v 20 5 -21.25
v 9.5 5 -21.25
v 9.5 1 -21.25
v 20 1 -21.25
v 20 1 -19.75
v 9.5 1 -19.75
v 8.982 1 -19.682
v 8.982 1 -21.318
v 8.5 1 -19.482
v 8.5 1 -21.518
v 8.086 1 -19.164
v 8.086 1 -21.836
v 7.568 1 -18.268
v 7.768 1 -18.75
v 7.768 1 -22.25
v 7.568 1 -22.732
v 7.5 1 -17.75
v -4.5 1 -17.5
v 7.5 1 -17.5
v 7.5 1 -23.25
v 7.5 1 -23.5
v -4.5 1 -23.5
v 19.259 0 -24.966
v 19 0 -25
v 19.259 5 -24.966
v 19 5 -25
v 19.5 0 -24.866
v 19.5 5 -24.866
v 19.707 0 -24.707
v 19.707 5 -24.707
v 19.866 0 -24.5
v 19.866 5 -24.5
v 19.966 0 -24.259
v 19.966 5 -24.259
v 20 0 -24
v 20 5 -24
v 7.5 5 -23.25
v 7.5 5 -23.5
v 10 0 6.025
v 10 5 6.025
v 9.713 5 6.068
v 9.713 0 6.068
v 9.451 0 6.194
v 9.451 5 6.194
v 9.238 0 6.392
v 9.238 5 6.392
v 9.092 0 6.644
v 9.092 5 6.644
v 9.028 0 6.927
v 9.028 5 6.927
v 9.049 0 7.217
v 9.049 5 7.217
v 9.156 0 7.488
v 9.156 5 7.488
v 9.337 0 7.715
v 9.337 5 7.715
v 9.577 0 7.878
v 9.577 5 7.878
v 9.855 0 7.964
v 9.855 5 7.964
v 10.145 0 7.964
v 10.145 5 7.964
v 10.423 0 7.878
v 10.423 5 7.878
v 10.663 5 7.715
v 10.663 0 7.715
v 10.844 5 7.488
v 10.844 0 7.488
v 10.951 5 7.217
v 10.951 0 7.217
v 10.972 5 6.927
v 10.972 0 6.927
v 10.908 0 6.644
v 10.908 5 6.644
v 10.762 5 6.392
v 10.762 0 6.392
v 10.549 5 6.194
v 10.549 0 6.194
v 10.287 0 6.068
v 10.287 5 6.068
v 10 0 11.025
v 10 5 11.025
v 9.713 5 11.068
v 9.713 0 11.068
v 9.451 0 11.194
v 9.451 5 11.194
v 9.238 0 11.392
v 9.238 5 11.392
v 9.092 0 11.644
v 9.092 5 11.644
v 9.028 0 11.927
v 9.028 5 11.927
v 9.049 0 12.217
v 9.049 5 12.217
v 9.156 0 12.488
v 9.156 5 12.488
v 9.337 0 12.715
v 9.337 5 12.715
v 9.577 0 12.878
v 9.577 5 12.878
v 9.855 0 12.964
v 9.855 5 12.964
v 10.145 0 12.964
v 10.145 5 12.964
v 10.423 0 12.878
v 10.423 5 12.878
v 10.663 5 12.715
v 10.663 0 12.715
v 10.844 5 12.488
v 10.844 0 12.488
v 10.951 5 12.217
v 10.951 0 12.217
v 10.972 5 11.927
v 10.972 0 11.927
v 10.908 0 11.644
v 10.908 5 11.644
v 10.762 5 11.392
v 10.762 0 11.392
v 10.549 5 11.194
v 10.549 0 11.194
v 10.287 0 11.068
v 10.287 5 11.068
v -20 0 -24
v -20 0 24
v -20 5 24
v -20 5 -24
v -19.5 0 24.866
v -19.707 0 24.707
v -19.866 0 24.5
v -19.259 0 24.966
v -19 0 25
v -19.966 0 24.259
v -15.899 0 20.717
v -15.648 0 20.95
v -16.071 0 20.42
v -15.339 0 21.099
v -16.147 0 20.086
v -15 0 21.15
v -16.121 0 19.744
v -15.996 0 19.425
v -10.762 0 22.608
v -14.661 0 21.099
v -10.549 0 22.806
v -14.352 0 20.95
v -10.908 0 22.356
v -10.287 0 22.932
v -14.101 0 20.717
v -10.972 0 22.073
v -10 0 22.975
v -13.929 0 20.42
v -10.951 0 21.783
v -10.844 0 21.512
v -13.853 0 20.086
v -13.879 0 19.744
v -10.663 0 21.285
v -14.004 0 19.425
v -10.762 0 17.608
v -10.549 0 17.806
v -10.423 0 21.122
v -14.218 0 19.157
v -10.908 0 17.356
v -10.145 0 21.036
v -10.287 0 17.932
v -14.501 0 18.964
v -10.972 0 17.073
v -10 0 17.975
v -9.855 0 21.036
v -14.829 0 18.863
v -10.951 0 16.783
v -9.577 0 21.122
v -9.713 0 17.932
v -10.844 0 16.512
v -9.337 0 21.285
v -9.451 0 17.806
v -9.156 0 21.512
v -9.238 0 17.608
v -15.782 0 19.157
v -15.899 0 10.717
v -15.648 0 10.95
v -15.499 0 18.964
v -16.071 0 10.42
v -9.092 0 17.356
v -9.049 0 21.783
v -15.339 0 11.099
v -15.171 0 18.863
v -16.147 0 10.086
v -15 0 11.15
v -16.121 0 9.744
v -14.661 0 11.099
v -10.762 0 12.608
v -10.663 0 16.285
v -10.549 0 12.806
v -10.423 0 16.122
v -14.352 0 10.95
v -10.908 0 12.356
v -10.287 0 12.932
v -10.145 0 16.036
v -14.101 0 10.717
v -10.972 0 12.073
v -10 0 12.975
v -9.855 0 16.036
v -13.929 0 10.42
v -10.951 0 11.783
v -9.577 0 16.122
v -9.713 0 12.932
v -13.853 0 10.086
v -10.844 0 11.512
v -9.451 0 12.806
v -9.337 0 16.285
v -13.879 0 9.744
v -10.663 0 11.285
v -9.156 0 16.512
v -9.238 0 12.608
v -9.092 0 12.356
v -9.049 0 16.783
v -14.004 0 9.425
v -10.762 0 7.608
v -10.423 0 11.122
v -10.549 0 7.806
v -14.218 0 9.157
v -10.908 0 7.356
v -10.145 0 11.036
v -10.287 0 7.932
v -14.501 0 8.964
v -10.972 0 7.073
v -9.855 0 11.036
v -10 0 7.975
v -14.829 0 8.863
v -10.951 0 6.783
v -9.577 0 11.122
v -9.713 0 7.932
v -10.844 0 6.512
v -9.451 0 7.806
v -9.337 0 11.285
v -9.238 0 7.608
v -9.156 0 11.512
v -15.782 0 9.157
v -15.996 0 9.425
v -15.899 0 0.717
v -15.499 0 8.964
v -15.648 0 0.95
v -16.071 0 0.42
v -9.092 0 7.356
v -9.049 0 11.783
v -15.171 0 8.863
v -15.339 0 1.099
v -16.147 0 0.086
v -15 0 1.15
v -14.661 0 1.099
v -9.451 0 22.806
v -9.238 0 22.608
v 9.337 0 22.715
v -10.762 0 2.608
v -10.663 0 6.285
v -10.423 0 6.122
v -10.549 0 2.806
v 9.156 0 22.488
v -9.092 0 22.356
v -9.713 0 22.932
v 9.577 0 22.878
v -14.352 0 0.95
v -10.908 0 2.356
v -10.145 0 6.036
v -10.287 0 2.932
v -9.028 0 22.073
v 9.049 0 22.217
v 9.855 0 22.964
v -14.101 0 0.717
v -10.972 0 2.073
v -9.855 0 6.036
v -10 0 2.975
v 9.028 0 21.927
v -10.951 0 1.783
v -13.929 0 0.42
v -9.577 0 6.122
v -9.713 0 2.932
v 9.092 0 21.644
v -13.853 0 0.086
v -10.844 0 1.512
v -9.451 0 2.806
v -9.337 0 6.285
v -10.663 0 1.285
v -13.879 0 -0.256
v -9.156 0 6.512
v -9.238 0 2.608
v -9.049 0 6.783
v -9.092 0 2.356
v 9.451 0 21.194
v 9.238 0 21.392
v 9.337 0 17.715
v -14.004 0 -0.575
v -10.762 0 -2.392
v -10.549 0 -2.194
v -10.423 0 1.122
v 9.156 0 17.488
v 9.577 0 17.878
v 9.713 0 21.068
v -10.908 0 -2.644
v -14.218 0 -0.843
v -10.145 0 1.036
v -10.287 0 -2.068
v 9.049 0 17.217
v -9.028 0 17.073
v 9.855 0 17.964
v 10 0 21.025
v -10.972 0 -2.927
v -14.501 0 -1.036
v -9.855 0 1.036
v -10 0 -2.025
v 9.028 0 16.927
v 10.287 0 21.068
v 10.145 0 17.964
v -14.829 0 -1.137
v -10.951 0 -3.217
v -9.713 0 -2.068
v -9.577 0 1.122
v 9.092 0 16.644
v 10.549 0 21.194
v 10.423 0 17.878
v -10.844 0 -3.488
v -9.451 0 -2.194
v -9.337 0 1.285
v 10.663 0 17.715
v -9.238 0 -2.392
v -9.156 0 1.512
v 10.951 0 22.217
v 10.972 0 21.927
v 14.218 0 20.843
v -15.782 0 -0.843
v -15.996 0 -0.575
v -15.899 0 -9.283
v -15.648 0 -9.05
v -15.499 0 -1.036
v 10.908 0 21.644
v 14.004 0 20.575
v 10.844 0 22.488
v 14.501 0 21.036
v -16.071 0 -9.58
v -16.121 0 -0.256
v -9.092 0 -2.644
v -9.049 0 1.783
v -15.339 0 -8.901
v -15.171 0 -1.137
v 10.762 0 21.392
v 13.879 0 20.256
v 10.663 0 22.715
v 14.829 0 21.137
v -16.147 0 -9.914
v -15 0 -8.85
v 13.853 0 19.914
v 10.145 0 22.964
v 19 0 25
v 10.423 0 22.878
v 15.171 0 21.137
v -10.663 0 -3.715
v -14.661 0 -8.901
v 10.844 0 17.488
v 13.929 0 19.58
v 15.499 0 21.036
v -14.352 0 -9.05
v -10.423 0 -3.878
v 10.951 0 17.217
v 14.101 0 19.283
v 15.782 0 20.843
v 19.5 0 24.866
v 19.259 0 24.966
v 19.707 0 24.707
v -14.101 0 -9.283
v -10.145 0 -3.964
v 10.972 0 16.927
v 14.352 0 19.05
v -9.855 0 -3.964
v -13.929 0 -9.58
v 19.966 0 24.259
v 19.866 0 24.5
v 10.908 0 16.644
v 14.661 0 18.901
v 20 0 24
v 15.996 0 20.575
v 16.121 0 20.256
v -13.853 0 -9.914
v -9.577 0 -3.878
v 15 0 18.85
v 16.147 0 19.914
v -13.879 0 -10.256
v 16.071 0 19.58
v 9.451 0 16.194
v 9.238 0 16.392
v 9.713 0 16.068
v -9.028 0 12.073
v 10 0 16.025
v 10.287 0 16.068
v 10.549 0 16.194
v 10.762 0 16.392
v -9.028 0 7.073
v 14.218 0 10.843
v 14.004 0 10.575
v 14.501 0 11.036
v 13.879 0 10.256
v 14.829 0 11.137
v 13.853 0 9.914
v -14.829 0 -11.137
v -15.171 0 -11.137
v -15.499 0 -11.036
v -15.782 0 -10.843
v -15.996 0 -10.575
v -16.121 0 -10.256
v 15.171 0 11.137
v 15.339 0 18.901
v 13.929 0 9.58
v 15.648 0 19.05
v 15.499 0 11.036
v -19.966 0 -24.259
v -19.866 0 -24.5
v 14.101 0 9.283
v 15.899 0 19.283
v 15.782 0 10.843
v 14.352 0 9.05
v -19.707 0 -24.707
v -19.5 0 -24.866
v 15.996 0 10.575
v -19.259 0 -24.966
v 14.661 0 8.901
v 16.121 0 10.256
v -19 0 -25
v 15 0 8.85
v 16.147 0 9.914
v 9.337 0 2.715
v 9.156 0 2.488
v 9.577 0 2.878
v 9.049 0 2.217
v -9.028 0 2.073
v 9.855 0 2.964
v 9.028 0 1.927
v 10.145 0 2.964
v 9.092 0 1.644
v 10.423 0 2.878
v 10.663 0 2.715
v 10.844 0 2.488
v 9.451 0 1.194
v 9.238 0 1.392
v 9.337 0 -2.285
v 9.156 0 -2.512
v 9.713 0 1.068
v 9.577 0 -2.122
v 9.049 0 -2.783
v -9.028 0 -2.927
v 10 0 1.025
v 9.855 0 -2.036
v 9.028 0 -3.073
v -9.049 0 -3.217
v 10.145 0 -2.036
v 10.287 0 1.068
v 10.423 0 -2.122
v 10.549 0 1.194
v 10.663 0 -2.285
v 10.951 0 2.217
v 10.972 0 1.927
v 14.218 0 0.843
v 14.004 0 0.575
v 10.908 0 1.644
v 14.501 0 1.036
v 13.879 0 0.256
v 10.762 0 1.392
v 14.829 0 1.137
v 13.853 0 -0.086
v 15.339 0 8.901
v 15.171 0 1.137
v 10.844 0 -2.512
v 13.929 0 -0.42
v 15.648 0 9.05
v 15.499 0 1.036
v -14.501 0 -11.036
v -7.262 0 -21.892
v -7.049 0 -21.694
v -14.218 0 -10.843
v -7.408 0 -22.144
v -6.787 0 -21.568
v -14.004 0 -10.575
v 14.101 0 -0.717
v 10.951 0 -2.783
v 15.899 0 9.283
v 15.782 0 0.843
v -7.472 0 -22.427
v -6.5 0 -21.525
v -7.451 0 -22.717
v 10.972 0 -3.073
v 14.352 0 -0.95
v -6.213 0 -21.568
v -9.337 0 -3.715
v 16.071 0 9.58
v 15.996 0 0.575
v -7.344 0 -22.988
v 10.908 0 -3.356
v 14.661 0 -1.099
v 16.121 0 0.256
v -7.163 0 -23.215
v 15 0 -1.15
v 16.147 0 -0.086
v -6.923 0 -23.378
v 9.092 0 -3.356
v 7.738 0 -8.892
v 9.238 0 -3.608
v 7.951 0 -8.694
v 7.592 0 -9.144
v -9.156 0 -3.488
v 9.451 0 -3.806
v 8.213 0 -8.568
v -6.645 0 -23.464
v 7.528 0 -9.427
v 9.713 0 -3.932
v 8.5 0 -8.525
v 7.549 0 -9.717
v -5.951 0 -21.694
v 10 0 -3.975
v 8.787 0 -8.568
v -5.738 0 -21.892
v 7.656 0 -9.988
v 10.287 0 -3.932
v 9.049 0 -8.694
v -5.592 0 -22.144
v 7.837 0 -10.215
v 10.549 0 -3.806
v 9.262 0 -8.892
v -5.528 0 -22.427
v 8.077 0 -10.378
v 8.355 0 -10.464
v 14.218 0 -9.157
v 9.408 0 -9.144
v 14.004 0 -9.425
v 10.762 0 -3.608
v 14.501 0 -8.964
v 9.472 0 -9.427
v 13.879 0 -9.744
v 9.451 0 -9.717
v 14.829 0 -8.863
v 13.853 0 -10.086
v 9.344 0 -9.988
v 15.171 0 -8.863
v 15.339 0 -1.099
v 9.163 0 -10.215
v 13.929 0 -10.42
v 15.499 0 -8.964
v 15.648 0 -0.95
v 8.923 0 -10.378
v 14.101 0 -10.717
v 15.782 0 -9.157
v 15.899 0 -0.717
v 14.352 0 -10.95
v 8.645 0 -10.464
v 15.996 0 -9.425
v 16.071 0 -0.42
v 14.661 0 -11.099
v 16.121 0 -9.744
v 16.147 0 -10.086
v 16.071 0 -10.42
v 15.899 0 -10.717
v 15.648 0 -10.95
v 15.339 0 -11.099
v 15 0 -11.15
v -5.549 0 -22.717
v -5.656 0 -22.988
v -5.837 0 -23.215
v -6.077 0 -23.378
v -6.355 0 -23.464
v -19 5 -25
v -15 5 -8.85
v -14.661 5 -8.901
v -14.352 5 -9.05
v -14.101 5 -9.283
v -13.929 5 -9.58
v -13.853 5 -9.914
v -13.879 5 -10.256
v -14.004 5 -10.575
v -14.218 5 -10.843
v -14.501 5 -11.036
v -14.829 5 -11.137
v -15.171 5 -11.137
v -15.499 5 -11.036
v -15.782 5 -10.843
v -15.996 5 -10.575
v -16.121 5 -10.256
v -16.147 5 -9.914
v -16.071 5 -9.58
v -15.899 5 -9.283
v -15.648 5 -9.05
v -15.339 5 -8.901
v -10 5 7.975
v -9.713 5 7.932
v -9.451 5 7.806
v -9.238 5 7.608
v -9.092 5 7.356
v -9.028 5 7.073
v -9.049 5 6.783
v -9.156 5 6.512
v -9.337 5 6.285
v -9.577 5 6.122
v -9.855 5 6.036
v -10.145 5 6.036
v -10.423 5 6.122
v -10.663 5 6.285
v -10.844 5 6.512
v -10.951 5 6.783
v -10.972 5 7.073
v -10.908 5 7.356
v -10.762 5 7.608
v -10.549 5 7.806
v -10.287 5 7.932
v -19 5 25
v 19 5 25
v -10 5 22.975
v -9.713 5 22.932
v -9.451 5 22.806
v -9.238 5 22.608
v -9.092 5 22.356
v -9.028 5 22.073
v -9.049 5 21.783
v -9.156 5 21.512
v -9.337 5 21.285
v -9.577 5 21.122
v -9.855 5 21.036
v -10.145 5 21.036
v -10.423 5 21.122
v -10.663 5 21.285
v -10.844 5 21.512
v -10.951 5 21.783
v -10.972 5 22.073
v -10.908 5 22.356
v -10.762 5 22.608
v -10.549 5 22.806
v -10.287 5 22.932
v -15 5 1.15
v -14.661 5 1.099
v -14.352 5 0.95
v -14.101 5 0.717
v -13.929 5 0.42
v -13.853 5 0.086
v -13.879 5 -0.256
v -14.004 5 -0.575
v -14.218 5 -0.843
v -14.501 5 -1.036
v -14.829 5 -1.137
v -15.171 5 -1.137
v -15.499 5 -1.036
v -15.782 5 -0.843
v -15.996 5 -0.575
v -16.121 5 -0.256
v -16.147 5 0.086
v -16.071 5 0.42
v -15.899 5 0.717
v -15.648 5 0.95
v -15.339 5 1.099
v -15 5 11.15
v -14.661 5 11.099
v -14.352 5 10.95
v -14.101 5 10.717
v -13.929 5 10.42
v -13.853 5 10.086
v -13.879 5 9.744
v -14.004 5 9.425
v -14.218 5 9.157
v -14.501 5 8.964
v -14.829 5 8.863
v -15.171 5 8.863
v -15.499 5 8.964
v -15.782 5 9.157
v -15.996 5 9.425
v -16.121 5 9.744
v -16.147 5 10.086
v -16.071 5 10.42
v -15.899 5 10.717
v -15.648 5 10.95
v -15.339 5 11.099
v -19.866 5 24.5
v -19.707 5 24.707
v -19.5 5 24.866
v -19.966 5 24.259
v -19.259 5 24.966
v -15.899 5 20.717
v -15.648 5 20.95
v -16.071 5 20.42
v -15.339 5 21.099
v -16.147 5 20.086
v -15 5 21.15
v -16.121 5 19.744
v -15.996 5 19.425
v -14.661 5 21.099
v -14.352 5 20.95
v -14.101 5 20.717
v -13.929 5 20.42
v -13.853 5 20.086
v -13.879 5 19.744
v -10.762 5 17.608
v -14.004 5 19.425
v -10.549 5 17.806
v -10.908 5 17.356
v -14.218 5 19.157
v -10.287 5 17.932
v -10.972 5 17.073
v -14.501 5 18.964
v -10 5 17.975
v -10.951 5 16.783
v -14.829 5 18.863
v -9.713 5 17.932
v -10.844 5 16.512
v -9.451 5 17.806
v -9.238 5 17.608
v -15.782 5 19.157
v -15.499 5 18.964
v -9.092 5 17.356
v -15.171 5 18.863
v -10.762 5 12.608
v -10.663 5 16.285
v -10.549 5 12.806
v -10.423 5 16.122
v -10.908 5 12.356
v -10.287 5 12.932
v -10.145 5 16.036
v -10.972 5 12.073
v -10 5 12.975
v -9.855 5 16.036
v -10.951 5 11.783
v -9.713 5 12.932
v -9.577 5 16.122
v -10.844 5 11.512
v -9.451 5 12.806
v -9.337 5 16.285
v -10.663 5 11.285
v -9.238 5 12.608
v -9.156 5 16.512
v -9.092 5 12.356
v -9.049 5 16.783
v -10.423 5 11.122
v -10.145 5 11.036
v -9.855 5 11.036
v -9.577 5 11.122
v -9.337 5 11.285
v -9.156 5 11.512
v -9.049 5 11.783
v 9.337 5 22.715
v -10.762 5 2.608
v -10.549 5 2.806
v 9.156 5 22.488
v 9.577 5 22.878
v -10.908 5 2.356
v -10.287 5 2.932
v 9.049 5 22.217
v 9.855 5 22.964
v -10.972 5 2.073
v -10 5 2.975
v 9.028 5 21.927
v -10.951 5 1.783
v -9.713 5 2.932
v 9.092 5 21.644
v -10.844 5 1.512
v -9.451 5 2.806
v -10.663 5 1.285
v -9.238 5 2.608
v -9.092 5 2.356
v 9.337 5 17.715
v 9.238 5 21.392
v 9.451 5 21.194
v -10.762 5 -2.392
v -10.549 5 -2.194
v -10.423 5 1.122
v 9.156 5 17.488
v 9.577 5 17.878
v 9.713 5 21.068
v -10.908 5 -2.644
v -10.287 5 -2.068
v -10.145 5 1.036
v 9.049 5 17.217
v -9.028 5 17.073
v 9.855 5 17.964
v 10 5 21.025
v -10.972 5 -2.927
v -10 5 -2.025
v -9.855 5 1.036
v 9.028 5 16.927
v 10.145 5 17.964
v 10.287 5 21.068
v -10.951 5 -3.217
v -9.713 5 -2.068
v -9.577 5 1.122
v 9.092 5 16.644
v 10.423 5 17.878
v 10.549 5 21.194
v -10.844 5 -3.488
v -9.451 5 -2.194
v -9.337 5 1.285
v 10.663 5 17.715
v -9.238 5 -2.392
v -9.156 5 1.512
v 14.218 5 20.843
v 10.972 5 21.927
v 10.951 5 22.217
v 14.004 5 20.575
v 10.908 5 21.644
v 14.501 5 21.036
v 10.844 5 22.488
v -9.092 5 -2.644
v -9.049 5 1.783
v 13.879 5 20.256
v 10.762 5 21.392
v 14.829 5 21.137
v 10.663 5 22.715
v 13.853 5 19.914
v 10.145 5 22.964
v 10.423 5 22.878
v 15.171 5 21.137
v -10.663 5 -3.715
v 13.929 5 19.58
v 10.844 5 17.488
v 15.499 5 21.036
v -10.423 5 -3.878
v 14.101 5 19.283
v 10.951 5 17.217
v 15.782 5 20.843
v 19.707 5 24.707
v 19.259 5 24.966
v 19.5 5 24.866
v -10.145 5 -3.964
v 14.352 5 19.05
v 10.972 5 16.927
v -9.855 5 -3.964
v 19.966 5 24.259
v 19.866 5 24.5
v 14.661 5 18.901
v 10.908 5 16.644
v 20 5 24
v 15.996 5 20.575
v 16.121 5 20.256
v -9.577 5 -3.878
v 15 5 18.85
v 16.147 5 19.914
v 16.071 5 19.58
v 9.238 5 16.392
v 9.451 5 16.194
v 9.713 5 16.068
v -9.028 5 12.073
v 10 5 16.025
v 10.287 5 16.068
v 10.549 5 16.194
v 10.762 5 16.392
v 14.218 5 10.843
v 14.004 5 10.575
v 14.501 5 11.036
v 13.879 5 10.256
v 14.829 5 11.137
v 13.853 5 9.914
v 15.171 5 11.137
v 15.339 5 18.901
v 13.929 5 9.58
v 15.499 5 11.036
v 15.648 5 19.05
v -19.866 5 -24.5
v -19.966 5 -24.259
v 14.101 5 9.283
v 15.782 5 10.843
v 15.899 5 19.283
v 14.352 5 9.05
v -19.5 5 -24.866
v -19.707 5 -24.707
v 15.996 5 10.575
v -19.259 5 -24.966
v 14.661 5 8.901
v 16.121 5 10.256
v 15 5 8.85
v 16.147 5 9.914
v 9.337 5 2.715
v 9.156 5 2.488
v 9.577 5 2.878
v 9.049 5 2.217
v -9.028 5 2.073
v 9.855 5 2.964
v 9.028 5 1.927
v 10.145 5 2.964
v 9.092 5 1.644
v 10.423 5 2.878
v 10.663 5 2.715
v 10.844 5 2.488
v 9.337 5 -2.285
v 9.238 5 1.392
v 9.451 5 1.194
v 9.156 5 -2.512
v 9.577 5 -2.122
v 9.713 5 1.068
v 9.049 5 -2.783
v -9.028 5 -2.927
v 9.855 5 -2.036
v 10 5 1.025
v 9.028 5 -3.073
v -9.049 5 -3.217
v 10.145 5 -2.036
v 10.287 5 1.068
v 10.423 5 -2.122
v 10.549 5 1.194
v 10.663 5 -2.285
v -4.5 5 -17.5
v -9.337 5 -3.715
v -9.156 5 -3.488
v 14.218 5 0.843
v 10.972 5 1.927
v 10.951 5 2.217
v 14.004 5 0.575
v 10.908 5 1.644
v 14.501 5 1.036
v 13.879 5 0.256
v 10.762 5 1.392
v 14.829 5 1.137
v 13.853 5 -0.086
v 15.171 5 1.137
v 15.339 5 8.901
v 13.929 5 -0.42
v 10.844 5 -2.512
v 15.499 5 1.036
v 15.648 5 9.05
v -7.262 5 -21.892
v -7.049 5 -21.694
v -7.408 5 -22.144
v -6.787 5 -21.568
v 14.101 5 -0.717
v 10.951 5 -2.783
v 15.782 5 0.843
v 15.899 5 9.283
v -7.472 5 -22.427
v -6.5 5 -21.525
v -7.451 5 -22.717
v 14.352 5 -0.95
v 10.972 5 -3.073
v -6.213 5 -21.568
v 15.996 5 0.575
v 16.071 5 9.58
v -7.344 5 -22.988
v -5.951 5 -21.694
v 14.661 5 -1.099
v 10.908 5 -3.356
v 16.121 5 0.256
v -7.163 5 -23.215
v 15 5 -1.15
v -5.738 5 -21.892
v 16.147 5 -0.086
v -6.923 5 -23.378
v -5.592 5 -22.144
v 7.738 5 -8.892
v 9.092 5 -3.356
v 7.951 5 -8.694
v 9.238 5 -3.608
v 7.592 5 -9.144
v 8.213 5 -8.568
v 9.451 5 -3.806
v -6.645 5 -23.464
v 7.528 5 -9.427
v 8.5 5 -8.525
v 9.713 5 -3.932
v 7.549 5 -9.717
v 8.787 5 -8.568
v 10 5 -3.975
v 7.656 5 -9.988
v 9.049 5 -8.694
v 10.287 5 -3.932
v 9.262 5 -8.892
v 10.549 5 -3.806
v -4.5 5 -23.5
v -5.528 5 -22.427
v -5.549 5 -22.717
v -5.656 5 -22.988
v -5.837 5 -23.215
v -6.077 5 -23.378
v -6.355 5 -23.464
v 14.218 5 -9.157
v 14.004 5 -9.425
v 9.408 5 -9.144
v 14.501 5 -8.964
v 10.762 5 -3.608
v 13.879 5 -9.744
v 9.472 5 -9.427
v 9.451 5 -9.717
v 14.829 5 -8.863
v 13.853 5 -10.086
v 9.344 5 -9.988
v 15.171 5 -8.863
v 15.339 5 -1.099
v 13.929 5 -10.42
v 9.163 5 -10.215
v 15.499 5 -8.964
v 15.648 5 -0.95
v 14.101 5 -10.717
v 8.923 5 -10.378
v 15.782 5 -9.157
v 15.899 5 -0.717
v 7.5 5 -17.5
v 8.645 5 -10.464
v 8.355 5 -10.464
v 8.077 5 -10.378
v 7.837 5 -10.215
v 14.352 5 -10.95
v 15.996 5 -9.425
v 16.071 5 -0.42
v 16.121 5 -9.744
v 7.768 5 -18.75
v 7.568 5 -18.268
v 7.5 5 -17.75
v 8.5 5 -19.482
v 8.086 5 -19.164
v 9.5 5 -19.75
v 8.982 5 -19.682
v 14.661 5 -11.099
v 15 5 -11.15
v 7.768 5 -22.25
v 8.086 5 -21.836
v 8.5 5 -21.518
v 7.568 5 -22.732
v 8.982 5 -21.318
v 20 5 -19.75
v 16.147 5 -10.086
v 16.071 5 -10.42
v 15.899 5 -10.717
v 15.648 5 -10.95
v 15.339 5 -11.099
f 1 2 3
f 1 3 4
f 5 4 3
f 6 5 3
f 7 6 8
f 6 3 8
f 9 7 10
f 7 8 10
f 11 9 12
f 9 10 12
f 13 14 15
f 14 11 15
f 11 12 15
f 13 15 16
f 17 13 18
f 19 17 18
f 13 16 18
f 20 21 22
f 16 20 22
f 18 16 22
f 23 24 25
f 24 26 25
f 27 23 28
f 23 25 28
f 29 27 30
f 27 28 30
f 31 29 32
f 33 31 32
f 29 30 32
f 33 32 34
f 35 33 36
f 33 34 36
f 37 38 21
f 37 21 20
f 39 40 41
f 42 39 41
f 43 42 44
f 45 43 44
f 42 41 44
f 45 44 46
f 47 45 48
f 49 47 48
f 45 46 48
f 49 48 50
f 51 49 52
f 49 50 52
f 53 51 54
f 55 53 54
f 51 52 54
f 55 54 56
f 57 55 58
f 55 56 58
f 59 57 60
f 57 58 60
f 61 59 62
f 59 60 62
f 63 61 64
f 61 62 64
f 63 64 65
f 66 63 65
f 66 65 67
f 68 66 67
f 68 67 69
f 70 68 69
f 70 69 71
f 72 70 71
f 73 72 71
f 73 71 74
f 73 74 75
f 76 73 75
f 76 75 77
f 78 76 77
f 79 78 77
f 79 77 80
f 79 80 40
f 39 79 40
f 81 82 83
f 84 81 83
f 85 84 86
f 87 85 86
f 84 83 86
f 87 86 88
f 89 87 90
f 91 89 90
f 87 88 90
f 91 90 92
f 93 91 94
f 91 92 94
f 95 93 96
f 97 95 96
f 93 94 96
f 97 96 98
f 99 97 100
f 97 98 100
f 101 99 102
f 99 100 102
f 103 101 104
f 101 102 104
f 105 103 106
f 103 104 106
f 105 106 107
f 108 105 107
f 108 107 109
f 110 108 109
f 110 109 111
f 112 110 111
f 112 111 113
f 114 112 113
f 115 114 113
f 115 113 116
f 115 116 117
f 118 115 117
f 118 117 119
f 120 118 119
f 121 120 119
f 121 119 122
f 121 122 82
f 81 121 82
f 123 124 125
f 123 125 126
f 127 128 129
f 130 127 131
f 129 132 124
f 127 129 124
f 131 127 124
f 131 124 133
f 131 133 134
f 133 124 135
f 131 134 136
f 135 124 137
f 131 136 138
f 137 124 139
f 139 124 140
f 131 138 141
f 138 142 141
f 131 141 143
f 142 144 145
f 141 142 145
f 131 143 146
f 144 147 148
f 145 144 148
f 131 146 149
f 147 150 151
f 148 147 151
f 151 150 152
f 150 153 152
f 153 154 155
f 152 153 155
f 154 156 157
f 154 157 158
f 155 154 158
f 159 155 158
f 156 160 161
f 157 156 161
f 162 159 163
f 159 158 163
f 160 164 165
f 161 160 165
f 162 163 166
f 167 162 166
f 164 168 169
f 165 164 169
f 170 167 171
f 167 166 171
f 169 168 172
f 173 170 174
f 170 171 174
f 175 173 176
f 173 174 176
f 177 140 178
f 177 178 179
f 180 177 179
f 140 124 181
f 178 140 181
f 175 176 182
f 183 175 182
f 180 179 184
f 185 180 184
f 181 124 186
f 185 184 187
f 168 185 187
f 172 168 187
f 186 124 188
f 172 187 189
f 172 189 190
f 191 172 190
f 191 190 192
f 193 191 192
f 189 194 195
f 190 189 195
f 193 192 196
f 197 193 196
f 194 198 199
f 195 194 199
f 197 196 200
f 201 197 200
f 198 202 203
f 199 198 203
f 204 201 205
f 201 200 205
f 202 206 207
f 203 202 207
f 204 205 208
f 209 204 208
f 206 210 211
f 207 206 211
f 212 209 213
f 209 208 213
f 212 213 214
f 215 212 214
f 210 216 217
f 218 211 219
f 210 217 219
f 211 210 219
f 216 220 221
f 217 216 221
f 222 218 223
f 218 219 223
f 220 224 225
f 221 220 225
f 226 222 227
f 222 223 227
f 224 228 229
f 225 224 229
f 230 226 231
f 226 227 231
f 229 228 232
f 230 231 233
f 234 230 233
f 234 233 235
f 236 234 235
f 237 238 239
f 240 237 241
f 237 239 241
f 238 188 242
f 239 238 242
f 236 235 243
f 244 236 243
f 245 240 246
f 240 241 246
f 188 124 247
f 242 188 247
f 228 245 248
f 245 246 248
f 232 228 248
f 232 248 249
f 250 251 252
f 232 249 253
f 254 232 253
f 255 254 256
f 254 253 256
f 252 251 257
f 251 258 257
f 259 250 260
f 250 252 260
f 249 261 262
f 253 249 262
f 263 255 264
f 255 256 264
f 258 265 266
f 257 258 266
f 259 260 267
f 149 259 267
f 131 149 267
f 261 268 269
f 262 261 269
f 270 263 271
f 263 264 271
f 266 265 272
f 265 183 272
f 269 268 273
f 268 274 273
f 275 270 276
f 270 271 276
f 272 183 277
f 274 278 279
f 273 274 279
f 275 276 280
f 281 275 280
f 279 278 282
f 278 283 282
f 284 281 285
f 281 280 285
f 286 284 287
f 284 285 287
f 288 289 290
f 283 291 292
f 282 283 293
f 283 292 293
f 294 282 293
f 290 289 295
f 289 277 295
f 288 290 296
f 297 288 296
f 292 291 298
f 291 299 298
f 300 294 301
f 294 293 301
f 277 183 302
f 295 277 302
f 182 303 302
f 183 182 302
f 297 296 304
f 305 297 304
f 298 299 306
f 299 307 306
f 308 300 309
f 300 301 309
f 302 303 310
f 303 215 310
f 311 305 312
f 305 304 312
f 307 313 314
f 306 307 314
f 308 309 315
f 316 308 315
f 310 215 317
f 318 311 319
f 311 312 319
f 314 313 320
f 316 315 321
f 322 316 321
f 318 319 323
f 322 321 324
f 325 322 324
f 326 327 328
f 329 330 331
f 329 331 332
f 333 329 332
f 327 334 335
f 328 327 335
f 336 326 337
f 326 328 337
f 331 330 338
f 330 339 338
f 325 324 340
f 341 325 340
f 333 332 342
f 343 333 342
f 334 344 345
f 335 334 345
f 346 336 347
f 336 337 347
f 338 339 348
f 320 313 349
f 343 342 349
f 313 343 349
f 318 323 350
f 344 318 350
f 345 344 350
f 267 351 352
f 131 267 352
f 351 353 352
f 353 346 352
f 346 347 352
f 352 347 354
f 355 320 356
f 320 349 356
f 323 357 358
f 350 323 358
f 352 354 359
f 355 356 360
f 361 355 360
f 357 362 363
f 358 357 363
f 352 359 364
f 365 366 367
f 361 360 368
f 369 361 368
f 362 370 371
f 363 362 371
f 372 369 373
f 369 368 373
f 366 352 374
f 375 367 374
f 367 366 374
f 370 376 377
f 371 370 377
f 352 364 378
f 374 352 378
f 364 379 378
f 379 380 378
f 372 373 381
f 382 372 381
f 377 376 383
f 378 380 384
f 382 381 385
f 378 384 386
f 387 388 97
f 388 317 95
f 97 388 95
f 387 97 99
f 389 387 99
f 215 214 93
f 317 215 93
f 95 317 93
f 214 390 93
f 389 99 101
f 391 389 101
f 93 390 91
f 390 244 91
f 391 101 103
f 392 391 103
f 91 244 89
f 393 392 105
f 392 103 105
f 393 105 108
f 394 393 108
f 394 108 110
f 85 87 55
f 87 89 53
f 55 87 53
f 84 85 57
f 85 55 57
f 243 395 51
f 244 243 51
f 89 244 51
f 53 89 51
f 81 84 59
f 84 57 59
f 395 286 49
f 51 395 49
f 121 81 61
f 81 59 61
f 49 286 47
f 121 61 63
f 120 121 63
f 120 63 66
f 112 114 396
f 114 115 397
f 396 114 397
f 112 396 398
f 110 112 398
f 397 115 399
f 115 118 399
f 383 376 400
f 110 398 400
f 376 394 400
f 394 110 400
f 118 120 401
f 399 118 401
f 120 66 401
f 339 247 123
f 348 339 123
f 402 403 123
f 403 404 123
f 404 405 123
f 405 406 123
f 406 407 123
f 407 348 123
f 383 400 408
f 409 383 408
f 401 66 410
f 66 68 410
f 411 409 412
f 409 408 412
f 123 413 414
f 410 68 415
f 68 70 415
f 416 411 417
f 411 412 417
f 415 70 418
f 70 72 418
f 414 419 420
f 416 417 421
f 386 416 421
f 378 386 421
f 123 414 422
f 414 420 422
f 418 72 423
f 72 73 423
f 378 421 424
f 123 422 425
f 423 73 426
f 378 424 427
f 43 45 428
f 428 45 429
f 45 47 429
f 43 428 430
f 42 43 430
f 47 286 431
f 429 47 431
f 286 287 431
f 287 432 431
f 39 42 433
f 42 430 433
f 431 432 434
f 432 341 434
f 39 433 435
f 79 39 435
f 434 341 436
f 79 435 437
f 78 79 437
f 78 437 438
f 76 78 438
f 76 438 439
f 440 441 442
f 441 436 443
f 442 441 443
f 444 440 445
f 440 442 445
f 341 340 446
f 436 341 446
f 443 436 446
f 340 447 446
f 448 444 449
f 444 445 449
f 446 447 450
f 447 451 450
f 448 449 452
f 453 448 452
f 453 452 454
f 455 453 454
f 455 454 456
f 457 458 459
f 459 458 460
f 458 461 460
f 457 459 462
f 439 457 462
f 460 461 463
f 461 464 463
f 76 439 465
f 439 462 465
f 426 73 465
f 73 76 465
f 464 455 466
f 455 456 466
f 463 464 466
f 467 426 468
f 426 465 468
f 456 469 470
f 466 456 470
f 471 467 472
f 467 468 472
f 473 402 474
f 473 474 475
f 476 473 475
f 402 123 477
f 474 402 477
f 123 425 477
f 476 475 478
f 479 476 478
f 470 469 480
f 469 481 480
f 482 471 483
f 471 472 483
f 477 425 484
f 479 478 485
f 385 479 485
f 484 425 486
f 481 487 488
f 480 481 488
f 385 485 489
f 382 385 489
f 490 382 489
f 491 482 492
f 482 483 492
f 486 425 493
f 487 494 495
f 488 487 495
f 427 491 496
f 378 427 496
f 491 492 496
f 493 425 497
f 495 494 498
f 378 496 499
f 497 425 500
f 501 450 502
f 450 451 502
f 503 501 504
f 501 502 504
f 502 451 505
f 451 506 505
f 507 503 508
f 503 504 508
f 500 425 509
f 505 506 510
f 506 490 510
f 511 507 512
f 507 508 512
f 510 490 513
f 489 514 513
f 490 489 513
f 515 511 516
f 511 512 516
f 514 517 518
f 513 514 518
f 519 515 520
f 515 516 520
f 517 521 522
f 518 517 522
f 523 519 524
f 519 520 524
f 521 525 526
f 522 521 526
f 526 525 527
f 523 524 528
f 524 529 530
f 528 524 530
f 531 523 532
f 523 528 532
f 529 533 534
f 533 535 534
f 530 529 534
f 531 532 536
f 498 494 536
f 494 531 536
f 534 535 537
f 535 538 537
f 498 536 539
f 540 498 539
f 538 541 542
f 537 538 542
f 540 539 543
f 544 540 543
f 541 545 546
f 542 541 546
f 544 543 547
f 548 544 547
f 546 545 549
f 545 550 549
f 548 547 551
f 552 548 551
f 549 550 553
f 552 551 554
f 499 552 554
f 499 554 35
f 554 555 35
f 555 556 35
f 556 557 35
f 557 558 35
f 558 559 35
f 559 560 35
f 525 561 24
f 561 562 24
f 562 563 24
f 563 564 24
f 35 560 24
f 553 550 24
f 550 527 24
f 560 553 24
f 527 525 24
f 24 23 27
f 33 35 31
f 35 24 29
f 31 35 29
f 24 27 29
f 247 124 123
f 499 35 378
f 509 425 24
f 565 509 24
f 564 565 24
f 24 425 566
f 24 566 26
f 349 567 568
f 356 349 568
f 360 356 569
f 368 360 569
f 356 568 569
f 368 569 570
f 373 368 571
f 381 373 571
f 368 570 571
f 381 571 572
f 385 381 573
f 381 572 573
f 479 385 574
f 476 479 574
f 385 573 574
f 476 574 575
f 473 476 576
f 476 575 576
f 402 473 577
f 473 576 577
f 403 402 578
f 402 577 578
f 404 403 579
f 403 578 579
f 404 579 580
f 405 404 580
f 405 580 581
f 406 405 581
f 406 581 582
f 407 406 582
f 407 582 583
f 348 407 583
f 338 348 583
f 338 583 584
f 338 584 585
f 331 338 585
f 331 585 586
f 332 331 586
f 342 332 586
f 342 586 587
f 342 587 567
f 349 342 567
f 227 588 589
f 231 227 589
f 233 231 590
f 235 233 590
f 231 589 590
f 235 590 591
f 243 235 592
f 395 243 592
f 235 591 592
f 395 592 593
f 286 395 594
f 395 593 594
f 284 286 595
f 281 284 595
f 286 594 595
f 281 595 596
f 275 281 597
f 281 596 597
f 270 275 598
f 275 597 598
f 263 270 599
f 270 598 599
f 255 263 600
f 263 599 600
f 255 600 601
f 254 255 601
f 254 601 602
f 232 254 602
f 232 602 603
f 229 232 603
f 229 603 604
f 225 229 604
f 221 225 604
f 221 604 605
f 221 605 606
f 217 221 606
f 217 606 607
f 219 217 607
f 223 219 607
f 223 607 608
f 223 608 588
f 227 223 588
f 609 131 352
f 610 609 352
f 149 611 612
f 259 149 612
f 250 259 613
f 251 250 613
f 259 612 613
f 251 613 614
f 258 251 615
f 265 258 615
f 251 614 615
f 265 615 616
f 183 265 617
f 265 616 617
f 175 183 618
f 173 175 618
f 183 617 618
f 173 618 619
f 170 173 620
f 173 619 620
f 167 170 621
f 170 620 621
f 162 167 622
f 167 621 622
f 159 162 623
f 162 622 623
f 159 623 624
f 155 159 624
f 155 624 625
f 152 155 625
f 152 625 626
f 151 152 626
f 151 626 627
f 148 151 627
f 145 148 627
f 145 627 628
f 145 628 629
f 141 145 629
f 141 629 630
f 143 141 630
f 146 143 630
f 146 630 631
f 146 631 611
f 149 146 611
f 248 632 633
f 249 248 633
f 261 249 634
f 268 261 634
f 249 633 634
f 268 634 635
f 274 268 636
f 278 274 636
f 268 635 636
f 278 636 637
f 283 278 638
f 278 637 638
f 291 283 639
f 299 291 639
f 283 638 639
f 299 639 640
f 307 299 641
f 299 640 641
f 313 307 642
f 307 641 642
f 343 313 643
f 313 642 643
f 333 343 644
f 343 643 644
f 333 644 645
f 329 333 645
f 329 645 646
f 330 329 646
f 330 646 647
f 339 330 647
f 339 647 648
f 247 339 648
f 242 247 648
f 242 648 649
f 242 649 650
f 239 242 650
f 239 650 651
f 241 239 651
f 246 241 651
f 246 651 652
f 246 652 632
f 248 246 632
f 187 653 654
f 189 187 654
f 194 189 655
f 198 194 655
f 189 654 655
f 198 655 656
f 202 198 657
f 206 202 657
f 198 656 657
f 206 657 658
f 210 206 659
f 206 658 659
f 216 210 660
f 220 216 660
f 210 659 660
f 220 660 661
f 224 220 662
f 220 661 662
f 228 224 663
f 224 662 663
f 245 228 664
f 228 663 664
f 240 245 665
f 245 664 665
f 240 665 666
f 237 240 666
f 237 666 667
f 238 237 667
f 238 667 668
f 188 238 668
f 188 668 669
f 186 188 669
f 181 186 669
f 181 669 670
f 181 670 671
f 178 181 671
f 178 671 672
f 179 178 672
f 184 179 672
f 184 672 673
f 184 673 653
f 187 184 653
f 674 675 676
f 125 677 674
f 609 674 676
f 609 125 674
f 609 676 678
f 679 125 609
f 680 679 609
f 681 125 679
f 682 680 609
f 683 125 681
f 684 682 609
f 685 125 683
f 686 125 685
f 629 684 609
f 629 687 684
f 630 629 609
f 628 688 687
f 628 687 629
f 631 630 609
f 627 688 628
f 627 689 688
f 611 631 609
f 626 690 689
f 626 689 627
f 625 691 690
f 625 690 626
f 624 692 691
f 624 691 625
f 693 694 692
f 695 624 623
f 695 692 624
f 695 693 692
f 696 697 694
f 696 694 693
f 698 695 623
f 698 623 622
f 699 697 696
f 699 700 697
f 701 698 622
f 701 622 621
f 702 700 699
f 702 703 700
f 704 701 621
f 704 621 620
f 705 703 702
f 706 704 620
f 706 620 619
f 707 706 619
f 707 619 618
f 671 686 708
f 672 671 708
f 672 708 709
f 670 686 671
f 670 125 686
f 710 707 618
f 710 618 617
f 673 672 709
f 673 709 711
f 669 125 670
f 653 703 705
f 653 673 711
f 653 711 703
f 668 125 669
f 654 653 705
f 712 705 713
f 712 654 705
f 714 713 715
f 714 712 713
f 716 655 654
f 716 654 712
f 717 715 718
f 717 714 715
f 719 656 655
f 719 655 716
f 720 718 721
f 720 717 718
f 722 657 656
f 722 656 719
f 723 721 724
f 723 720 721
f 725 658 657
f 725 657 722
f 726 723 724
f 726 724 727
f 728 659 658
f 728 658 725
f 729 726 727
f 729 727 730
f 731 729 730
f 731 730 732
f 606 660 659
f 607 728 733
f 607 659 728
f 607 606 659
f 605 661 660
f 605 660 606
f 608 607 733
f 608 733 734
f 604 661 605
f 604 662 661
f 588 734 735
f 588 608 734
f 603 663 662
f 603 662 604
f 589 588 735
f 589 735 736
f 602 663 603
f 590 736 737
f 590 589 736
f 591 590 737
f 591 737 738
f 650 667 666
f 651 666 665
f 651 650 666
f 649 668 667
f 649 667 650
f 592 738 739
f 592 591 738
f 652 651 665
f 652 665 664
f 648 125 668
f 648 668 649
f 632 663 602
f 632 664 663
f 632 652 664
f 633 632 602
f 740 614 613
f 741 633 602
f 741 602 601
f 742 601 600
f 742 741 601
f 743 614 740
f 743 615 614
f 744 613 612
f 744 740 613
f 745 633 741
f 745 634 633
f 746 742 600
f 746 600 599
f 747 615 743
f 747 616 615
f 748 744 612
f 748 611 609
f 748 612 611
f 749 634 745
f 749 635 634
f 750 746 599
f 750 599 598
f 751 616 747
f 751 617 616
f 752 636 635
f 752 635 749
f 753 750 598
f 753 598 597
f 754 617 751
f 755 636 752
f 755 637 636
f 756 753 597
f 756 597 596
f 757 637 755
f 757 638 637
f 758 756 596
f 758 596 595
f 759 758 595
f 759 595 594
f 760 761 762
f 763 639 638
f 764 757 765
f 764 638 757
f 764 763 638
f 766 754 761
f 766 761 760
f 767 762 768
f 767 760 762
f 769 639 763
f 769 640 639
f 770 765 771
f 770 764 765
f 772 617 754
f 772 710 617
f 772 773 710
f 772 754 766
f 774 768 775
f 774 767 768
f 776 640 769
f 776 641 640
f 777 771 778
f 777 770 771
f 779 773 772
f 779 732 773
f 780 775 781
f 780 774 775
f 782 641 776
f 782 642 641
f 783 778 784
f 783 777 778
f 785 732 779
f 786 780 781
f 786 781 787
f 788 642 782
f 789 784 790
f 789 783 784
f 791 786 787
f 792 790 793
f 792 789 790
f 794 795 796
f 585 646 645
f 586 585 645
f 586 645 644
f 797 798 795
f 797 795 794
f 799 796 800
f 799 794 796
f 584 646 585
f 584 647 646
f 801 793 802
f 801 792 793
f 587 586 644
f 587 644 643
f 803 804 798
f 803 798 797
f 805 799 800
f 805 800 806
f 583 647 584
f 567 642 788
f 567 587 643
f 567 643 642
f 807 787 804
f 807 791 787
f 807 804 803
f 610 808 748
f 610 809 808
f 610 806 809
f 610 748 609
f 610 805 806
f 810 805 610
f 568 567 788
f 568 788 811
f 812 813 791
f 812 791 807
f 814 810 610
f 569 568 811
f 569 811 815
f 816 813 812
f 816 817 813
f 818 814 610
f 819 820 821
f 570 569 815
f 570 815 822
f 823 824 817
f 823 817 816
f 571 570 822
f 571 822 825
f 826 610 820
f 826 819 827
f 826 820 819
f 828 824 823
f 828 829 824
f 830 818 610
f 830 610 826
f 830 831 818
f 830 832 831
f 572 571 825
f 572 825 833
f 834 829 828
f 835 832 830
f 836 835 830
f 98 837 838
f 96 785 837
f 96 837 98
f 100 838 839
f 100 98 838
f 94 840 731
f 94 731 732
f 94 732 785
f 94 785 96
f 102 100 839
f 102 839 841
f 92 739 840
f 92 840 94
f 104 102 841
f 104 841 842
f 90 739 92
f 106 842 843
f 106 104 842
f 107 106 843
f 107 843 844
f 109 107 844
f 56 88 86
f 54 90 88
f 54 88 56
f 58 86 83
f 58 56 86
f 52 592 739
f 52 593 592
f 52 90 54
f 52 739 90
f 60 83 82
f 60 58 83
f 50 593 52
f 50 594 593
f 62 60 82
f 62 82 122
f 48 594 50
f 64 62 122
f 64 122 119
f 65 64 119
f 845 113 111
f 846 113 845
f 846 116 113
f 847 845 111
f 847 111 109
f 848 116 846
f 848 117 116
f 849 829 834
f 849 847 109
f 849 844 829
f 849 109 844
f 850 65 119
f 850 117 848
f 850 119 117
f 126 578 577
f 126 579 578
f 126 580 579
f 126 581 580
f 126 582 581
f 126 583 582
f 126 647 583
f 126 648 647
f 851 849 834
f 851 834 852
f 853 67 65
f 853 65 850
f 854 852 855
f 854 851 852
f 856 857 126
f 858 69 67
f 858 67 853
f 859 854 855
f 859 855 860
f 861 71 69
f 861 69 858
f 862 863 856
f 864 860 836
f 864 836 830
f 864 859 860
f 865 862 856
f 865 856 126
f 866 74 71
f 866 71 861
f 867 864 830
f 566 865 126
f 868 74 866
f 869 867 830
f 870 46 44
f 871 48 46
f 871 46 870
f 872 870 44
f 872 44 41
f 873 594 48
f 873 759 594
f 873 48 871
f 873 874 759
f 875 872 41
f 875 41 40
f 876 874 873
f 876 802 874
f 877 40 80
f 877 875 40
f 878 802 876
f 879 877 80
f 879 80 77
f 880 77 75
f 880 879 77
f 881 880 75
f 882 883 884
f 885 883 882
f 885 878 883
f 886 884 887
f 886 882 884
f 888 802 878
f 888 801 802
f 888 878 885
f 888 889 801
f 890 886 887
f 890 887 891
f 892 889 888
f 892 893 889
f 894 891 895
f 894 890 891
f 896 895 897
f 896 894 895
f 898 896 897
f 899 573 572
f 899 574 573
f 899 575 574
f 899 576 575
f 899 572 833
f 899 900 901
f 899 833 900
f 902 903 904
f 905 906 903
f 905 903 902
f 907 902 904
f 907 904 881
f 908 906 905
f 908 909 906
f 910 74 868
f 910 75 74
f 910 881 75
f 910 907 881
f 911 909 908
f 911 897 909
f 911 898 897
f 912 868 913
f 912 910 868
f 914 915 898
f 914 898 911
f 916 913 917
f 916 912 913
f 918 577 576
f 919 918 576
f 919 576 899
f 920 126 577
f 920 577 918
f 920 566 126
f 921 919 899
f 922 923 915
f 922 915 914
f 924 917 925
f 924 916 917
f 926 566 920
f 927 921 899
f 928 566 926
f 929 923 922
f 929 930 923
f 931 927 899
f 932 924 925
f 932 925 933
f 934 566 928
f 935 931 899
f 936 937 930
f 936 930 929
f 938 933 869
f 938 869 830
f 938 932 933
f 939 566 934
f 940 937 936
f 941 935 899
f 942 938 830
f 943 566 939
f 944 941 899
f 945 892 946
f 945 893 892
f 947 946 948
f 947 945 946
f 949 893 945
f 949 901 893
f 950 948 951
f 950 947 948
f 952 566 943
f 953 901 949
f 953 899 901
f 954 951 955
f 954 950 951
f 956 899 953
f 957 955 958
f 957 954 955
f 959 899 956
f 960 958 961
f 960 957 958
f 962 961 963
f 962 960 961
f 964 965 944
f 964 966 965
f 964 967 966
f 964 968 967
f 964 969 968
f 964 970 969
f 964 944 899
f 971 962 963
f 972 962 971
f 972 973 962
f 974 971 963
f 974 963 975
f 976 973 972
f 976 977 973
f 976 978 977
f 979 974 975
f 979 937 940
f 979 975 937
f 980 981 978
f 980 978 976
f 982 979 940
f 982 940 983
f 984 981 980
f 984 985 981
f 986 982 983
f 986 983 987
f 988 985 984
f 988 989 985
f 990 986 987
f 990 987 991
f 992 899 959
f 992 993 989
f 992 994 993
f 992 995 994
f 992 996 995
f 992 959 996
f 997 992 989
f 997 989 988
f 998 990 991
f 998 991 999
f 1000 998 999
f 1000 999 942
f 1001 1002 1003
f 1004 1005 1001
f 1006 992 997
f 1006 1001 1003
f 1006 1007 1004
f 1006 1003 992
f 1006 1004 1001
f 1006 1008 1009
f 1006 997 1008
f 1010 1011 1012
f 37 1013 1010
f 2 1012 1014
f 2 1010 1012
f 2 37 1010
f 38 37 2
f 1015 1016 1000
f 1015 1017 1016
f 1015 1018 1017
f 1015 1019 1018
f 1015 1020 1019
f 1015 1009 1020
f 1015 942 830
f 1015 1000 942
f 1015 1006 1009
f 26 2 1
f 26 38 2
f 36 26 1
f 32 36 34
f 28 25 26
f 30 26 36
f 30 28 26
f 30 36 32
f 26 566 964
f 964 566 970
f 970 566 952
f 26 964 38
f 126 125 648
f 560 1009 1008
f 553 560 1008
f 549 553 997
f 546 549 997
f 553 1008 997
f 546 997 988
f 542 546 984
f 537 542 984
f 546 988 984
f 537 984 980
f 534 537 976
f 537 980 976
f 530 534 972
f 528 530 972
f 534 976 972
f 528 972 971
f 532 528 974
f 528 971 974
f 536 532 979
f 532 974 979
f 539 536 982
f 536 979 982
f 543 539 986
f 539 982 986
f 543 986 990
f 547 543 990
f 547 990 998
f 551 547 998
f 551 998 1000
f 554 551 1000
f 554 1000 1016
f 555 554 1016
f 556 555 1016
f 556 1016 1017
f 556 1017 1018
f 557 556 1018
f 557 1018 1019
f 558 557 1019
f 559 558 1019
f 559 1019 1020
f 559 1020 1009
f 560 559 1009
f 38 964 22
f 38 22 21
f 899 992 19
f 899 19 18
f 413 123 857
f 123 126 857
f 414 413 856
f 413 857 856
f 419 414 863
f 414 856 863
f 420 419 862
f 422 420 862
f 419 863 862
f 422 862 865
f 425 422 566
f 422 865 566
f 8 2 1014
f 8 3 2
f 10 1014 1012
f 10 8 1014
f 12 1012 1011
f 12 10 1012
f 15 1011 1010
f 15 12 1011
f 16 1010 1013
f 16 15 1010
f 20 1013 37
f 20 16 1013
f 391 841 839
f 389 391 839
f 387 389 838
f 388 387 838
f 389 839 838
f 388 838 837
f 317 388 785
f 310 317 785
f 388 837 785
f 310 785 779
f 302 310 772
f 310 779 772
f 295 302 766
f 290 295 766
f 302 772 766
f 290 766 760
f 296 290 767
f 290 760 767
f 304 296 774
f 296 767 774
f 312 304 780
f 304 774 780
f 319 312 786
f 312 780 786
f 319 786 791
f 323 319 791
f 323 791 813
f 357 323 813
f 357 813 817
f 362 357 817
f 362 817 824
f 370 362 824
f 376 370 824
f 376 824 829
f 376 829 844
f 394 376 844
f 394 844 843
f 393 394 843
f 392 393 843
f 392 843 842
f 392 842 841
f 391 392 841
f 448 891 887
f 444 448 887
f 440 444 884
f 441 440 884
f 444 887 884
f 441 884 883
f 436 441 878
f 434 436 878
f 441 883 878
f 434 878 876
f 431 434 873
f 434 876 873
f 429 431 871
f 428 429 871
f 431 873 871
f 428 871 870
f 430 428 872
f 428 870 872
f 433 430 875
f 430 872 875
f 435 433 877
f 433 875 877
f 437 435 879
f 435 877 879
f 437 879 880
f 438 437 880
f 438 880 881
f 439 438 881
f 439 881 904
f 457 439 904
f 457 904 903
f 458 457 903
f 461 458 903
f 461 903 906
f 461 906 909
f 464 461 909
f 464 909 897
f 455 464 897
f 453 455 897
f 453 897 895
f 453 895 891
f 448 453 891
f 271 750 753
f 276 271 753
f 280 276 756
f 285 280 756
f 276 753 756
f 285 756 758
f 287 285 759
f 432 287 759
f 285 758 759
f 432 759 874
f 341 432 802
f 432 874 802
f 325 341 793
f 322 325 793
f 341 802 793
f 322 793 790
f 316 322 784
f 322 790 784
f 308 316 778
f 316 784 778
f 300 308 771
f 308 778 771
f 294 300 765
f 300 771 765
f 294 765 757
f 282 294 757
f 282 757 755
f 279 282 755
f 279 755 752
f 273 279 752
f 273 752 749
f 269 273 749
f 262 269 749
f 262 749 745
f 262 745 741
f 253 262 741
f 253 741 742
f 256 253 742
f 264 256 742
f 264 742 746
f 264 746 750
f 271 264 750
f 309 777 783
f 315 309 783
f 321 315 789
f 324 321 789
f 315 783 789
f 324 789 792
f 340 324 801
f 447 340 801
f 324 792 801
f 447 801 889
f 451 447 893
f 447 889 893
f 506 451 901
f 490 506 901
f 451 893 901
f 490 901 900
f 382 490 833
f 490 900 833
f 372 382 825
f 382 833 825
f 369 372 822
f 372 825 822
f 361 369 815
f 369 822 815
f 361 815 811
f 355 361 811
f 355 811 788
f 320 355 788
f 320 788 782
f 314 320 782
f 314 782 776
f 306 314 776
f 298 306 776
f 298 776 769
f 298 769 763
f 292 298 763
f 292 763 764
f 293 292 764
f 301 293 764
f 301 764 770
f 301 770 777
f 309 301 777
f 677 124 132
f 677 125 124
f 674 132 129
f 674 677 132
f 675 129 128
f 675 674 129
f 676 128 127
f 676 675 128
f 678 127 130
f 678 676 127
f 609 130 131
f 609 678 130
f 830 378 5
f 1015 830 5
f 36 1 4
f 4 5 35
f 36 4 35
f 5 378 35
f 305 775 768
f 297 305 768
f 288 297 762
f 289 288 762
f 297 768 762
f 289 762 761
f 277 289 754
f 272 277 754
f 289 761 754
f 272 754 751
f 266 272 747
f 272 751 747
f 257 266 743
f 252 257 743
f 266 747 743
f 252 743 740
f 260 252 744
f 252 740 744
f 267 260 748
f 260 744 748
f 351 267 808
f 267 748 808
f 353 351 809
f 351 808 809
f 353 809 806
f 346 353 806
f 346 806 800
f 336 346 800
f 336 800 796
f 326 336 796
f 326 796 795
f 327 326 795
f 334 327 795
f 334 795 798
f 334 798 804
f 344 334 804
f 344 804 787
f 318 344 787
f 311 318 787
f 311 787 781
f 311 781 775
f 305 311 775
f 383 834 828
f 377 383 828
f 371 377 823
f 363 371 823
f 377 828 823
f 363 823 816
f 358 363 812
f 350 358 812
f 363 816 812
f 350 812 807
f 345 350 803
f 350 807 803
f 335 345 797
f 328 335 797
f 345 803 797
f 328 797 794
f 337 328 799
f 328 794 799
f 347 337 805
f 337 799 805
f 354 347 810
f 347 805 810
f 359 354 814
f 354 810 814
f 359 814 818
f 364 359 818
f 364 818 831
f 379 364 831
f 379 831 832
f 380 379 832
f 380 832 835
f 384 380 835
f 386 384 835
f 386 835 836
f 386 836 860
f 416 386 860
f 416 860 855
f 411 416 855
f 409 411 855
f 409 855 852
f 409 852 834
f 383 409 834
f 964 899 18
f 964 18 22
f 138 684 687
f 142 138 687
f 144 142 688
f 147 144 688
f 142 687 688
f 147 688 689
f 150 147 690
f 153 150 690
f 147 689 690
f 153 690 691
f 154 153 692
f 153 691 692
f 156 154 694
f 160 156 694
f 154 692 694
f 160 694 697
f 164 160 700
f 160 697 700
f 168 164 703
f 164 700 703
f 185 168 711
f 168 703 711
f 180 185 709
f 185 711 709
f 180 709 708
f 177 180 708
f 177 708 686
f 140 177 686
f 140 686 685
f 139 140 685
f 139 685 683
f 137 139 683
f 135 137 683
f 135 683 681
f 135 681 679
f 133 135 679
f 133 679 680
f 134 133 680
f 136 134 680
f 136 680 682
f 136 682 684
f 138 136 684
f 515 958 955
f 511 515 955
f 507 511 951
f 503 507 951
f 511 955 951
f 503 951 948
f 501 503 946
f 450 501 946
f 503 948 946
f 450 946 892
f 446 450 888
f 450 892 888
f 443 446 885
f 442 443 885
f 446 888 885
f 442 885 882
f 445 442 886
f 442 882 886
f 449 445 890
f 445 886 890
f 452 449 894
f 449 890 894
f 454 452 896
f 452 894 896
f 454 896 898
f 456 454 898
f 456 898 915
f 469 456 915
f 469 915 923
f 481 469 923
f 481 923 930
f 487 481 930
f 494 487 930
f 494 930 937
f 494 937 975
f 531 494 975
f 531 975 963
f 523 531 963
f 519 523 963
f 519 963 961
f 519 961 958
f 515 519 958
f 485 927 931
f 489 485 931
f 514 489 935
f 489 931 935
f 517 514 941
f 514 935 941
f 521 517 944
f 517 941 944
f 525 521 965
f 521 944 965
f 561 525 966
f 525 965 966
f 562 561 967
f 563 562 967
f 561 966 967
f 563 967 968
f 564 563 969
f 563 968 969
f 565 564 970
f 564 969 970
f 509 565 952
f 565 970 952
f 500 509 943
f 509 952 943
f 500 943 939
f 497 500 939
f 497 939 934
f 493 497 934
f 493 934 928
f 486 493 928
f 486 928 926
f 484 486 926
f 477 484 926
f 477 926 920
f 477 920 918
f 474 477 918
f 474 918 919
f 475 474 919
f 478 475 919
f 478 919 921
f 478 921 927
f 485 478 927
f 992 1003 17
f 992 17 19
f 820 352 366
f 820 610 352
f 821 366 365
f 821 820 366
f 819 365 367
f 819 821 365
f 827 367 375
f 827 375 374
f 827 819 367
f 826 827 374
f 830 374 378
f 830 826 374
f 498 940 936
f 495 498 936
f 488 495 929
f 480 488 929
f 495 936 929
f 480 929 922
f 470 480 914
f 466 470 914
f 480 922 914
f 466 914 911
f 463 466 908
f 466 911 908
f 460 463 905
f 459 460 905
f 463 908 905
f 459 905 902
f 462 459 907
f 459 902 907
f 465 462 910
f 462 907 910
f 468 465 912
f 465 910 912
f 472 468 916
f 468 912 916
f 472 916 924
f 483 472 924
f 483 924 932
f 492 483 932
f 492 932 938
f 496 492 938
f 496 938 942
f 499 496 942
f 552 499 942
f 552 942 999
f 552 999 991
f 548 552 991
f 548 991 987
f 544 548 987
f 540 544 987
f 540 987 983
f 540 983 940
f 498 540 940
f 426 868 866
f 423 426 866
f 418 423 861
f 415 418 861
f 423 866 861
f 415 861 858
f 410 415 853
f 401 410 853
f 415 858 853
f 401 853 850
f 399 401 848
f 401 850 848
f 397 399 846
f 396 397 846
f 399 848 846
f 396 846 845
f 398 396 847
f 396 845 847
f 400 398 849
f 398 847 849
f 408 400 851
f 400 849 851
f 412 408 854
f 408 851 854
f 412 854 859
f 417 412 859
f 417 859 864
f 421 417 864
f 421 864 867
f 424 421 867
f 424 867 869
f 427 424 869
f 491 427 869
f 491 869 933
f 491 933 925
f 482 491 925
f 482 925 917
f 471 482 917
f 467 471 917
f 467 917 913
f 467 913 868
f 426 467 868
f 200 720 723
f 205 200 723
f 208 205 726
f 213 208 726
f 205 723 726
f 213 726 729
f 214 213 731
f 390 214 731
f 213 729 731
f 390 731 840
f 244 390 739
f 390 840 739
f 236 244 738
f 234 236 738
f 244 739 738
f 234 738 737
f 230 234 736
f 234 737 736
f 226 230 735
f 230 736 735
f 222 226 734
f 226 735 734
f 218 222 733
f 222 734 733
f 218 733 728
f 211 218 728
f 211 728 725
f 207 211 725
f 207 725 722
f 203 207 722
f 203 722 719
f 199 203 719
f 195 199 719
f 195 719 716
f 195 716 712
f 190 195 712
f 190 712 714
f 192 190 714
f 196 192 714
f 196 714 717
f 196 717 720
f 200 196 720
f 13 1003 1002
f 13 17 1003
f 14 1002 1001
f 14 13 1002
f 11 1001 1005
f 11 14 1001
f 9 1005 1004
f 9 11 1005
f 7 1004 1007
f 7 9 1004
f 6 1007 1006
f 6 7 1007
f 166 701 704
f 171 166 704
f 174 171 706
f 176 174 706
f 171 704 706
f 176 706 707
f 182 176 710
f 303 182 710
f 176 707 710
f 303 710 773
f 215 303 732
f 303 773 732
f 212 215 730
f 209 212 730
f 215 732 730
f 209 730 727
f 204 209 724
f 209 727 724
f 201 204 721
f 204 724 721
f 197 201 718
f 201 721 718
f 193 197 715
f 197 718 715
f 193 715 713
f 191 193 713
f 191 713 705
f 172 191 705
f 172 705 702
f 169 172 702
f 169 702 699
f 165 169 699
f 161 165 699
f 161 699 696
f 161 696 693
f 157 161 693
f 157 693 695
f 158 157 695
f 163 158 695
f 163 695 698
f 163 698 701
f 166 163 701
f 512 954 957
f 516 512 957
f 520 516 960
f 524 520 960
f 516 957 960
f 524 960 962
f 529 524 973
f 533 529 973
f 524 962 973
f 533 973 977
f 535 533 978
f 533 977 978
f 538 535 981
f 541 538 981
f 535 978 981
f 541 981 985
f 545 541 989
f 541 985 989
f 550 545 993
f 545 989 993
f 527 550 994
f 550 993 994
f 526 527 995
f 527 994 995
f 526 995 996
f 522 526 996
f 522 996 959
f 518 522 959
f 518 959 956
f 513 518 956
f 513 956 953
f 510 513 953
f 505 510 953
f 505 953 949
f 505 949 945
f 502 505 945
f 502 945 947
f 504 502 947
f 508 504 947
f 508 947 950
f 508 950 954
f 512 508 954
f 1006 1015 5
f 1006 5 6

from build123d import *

# Parameters (mm, degrees)
SKETCH1_W           = 40
SKETCH1_H           = 50
BOSS_EXTRUDE1_DEPTH = 5
SKETCH9_R           = 1.15
CUT_EXTRUDE8_DEPTH  = 33.403703492
LPATTERN2_COUNT     = 3
LPATTERN2_PITCH     = 10
LPATTERN2_COL_COUNT = 2
LPATTERN2_COL_PITCH = 10
SKETCH4_R           = 0.975
CUT_EXTRUDE3_DEPTH  = 33.403703492
SKETCH5_R           = 0.975
CUT_EXTRUDE4_DEPTH  = 33.403703492
LPATTERN1_COUNT     = 6
LPATTERN1_PITCH     = 5
FILLET1_R           = 1
CUT_EXTRUDE7_DEPTH  = 4
FILLET2_R           = 2


with BuildPart() as part:
    # Sketch1 → Boss-Extrude1 (new body)
    with BuildSketch(Plane(origin=(0, 0, 0), x_dir=(1, 0, 0), z_dir=(0, 1, 0))):
        Rectangle(SKETCH1_W, SKETCH1_H)
    extrude(amount=BOSS_EXTRUDE1_DEPTH)

    # Sketch9 → Cut-Extrude8 (cut, through all)
    with BuildSketch(Plane(origin=(0, 5, 0), x_dir=(1, 0, 0), z_dir=(0, 1, 0))):
        with Locations(Location((-15, 0, 0), (0, 0, 270))):
            Circle(SKETCH9_R)
        with Locations(Location((15, 0, 0), (0, 0, 90))):
            Circle(SKETCH9_R)
    cut_extrude8 = extrude(amount=-CUT_EXTRUDE8_DEPTH, mode=Mode.SUBTRACT)

    # LPattern2: Cut-Extrude8 ×3
    with Locations(*[(0, 0, i * LPATTERN2_PITCH) for i in range(1, LPATTERN2_COUNT)]):
        add(cut_extrude8, mode=Mode.SUBTRACT)

    # LPattern2 col: Cut-Extrude8 ×2
    with Locations(*[(0, 0, -i * LPATTERN2_COL_PITCH) for i in range(1, LPATTERN2_COL_COUNT)]):
        add(cut_extrude8, mode=Mode.SUBTRACT)

    # Sketch4 → Cut-Extrude3 (cut, through all)
    with BuildSketch(Plane(origin=(0, 5, 0), x_dir=(1, 0, 0), z_dir=(0, 1, 0))):
        with Locations(Location((-6.5, 22.5, 0), (0, 0, 270))):
            Circle(SKETCH4_R)
        with Locations(Location((8.5, 9.5, 0), (0, 0, 270))):
            Circle(SKETCH4_R)
    extrude(amount=-CUT_EXTRUDE3_DEPTH, mode=Mode.SUBTRACT)

    # Sketch5 → Cut-Extrude4 (cut, through all)
    with BuildSketch(Plane(origin=(0, 5, 0), x_dir=(1, 0, 0), z_dir=(0, 1, 0))):
        with Locations(Location((-10, -22, 0), (0, 0, 270))):
            Circle(SKETCH5_R)
        with Locations(Location((10, -22, 0), (0, 0, 90))):
            Circle(SKETCH5_R)
    cut_extrude4 = extrude(amount=-CUT_EXTRUDE4_DEPTH, mode=Mode.SUBTRACT)

    # LPattern1: Cut-Extrude4 ×6
    with Locations(*[(0, 0, -i * LPATTERN1_PITCH) for i in range(1, LPATTERN1_COUNT)]):
        add(cut_extrude4, mode=Mode.SUBTRACT)

    # Fillet1
    fillet1_edges = [part.edges().sort_by_distance(p)[0] for p in [
        (20, 2.5, 25),
        (-20, 2.5, 25),
        (-20, 2.5, -25),
        (20, 2.5, -25),
    ]]
    fillet(fillet1_edges, radius=FILLET1_R)

    # Sketch8 → Cut-Extrude7 (cut)
    with BuildSketch(Plane(origin=(0, 5, 0), x_dir=(1, 0, 0), z_dir=(0, 1, 0))):
        Polygon((7.5, 23.5), (7.5, 21.25), (20, 21.25), (20, 19.75), (7.5, 19.75), (7.5, 17.5), (-4.5, 17.5), (-4.5, 23.5), align=None)
    extrude(amount=-CUT_EXTRUDE7_DEPTH, mode=Mode.SUBTRACT)

    # Fillet2
    fillet2_edges = [part.edges().sort_by_distance(p)[0] for p in [
        (7.5, 3, -19.75),
        (7.5, 3, -21.25),
    ]]
    fillet(fillet2_edges, radius=FILLET2_R)


solid = part.part
